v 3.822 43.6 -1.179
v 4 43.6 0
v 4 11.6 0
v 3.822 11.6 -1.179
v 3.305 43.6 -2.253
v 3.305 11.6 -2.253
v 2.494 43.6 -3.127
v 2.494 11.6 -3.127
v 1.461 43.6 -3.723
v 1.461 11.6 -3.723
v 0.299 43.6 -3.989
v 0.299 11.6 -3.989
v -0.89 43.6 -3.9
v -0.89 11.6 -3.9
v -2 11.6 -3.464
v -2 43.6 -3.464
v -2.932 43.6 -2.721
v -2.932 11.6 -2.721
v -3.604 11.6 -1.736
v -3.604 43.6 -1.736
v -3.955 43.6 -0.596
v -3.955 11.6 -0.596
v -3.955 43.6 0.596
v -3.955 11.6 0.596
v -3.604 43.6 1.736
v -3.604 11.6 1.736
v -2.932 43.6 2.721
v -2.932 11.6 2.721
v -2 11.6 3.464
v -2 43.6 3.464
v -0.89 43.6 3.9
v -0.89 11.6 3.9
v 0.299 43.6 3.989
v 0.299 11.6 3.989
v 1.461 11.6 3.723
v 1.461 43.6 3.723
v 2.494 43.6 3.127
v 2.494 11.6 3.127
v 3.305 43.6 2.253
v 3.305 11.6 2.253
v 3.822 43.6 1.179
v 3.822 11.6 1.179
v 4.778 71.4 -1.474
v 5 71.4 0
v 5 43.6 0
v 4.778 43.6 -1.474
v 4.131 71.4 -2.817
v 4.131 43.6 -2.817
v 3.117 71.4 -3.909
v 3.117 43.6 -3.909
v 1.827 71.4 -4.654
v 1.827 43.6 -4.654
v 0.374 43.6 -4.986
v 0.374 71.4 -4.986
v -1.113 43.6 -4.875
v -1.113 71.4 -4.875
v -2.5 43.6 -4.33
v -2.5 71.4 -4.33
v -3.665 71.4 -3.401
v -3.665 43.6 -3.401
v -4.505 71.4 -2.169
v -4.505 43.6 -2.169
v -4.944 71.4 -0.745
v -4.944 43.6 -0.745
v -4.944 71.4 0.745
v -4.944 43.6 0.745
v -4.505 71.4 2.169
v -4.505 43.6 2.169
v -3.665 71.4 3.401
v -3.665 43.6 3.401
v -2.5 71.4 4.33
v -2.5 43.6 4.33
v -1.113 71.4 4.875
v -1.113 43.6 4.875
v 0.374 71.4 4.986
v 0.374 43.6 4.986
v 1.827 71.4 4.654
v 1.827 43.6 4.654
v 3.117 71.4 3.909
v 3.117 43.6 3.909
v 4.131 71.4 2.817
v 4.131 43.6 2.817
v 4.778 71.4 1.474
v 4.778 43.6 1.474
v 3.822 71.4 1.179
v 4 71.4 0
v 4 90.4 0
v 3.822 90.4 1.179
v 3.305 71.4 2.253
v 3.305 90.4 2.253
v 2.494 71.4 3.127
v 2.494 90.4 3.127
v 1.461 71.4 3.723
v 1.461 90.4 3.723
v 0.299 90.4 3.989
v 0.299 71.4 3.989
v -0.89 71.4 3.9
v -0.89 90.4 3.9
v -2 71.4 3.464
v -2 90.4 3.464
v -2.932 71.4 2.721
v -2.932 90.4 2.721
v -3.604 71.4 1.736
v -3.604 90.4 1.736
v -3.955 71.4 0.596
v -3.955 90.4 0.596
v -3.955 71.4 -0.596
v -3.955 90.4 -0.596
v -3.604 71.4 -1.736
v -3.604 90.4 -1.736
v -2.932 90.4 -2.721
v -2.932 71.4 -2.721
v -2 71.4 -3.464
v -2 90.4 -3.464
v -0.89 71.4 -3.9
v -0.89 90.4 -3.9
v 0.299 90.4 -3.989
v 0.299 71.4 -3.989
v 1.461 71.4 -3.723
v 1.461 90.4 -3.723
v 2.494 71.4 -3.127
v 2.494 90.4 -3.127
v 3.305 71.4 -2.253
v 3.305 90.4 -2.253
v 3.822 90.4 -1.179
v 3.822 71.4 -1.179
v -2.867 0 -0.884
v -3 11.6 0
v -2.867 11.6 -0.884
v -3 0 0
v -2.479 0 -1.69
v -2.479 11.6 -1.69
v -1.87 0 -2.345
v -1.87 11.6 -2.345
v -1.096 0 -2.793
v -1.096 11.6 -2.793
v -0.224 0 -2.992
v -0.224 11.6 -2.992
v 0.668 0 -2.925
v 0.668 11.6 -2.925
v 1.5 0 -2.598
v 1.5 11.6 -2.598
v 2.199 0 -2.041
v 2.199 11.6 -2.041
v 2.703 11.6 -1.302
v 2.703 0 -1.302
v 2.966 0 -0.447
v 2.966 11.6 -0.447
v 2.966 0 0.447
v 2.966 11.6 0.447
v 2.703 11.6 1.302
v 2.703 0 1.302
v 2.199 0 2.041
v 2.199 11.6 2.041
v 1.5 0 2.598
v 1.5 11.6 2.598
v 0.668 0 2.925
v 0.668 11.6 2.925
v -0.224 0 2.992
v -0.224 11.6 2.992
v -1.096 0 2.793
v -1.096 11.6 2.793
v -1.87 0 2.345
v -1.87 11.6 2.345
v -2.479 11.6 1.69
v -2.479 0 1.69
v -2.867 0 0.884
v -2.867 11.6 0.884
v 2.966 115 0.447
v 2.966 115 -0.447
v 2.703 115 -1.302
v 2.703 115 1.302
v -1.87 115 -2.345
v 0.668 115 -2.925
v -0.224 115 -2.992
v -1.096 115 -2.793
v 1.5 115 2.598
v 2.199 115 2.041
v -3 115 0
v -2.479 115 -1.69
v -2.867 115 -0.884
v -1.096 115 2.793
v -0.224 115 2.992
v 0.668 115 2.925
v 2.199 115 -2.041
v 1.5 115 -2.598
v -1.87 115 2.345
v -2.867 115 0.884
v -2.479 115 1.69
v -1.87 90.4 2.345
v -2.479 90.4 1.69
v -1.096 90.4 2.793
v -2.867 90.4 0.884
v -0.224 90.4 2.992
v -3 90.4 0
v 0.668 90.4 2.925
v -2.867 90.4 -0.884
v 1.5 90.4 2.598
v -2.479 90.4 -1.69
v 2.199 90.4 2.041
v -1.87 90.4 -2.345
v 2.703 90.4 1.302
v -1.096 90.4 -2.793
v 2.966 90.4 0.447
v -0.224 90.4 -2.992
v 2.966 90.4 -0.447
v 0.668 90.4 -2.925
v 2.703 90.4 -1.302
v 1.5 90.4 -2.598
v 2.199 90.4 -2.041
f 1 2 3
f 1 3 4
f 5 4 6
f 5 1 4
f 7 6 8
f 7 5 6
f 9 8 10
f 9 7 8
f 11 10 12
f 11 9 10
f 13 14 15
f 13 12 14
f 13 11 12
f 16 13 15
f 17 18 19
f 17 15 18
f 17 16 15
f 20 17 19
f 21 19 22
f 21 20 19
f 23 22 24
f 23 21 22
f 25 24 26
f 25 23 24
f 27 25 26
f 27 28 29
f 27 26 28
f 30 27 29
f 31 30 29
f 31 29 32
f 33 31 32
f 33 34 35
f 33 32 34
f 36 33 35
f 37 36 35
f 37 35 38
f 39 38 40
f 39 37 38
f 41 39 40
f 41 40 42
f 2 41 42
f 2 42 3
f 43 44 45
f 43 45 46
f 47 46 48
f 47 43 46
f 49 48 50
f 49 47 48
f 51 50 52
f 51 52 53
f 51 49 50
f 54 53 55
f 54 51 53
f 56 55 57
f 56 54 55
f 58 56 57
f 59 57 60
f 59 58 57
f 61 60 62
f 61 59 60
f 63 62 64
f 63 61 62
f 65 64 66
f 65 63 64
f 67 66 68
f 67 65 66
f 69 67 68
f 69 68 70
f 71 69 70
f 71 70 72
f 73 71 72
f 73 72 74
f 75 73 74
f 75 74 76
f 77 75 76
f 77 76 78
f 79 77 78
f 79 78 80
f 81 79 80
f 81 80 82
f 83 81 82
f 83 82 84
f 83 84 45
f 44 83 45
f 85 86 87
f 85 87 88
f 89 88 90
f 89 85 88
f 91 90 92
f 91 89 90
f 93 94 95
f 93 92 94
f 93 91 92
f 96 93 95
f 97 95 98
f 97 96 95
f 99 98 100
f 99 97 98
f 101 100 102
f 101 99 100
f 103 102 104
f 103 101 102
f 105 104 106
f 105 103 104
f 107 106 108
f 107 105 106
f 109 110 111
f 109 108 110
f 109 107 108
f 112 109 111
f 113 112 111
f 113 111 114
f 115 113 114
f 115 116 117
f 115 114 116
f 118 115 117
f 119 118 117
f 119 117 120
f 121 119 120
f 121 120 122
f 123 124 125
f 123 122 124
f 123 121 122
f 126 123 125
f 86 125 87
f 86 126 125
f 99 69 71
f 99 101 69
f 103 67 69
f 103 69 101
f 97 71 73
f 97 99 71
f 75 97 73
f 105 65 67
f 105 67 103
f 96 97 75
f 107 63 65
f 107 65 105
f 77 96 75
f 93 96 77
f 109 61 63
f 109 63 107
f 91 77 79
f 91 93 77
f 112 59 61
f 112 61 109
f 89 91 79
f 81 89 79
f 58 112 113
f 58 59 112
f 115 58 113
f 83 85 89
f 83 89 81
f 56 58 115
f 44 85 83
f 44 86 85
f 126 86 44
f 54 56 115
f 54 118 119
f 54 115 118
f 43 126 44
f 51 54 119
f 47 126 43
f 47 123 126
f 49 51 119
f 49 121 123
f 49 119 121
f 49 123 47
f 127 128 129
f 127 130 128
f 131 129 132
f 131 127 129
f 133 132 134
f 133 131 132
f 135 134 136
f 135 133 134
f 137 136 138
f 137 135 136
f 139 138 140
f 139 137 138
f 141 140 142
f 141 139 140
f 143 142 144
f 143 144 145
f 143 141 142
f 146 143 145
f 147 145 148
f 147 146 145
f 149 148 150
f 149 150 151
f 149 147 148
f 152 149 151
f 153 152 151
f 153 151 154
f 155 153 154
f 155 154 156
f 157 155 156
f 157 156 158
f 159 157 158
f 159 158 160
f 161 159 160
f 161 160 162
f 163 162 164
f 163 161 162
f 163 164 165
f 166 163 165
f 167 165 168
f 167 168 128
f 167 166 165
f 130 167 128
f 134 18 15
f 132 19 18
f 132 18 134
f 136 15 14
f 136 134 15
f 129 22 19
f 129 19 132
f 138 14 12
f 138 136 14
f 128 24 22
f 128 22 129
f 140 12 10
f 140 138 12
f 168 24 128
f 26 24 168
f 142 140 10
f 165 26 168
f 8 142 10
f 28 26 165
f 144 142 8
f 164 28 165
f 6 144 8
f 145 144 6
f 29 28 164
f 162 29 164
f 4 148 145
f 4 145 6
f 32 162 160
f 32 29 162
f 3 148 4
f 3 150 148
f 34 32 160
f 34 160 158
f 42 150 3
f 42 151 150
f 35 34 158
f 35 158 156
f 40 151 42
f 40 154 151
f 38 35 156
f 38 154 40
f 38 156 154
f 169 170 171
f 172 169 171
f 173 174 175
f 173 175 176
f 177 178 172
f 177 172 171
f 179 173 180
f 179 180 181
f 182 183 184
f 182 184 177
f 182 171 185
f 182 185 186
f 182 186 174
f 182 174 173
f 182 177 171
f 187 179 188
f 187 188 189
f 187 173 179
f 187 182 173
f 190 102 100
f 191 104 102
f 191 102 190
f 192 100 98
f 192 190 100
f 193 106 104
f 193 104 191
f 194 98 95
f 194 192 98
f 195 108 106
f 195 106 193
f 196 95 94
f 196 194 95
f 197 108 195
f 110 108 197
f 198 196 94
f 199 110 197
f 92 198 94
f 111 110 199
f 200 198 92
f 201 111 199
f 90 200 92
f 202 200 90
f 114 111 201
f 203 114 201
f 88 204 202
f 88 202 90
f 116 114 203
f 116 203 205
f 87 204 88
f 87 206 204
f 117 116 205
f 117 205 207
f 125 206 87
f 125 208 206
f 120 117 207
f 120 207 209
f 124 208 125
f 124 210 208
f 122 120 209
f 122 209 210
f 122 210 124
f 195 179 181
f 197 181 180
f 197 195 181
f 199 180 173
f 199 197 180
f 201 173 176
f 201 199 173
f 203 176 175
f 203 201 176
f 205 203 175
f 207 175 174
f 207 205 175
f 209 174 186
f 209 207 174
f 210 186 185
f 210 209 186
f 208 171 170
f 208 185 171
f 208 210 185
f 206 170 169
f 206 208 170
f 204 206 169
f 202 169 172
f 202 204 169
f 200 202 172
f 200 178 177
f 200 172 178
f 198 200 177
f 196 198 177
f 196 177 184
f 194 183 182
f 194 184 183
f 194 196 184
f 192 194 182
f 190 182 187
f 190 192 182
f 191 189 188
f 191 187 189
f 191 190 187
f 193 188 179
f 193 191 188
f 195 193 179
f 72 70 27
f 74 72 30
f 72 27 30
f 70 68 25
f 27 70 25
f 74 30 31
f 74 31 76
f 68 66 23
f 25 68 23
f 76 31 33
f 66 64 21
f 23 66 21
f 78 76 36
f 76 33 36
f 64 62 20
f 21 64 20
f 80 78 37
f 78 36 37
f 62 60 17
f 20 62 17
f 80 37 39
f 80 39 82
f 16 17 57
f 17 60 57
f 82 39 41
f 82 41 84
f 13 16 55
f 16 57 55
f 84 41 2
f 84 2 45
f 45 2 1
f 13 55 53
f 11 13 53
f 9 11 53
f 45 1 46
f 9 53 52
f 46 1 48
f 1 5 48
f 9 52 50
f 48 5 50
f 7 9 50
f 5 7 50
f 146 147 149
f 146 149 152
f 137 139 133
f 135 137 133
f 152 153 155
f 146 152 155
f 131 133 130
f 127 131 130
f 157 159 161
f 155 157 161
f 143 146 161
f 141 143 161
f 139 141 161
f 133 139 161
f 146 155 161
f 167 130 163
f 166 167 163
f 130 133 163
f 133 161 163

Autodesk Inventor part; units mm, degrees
ref_plane "YZ Plane" through (0, 0, 0) normal (1, 0, 0) x (0, 1, 0)
ref_plane "XZ Plane" through (0, 0, 0) normal (0, 1, 0) x (-1, 0, 0)
ref_plane "XY Plane" through (0, 0, 0) normal (0, 0, 1) x (1, 0, 0)
sketch "スケッチ1" plane through (0, 0, 0) normal (0, 1, 0) x (-1, 0, 0)
  circle A0 centre (0, 0) radius 3
  dimension "d0" = 6
extrude "押し出し1" add sketch "スケッチ1" along normal blind 115
ref_plane "作業平面1" through (0, 57.5, 0) normal (0, 1, 0) x (1, 0, 0)
sketch "スケッチ2" plane through (0, 57.5, 0) normal (0, 1, 0) x (1, 0, 0)
  circle A0 centre (0, 0) radius 5
  dimension "d3" = 10
extrude "押し出し2" add sketch "スケッチ2" along normal blind 13.9 and the other way blind 13.9
sketch "スケッチ4" plane through (0, 43.6, 0) normal (0, -1, 0) x (1, 0, 0)
  circle A0 centre (0, 0) radius 4
  dimension "d9" = 8
extrude "押し出し3" add sketch "スケッチ4" along normal blind 32
sketch "スケッチ5" plane through (0, 71.4, 0) normal (0, 1, 0) x (1, 0, 0)
  circle A0 centre (0, 0) radius 4
  dimension "d12" = 8
extrude "押し出し4" add sketch "スケッチ5" along normal blind 19
properties part number "shoulder1_shaft copy"
